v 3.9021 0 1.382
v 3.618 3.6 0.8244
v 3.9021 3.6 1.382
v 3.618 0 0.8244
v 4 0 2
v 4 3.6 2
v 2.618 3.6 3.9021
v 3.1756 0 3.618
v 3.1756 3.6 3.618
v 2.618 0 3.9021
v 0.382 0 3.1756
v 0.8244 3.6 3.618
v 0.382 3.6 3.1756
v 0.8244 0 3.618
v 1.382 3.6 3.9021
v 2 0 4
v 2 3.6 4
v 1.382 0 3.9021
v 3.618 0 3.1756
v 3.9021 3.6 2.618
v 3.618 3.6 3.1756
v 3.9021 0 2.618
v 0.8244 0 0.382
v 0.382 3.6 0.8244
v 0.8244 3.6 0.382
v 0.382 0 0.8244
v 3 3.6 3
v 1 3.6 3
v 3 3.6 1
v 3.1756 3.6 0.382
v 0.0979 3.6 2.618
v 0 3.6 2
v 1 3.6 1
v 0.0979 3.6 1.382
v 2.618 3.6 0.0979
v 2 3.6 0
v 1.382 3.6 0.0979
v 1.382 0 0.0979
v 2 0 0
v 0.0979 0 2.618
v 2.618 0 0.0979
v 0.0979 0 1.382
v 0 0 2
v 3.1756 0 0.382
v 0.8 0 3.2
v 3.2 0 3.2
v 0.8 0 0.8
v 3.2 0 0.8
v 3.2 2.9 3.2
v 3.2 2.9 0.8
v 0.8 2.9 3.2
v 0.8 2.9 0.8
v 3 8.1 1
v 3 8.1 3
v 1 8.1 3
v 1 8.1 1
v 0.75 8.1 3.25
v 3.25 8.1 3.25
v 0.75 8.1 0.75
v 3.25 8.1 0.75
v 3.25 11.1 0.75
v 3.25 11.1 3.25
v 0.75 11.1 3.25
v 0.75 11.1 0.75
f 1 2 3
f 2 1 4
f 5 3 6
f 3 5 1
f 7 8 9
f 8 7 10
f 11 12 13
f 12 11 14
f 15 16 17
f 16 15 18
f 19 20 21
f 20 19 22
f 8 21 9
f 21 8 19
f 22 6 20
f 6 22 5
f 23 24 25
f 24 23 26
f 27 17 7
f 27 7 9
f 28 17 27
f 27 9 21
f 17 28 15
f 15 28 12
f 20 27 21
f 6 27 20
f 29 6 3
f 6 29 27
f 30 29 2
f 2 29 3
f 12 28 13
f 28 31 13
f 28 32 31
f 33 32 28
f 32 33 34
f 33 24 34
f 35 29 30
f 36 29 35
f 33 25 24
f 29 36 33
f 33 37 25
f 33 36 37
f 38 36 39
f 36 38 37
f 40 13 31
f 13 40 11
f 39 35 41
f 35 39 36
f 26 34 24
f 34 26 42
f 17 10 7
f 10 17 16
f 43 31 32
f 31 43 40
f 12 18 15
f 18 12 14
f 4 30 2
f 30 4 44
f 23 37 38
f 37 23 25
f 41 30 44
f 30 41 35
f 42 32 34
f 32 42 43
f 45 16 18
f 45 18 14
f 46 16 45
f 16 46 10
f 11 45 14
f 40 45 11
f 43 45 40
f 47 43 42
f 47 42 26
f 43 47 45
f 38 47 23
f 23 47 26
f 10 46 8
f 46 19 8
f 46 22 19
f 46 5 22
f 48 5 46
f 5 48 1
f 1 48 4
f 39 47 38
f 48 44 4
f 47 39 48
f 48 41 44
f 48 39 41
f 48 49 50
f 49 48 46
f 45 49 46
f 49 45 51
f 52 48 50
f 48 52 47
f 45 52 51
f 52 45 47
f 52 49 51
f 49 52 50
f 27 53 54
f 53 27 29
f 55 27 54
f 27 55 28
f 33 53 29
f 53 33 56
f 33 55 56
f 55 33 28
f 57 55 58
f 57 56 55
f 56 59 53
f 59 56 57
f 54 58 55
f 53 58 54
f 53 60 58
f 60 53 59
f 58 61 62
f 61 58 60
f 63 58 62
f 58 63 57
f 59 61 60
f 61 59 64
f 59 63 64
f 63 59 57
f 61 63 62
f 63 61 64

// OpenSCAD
// file: shared/measurements.scad
/*
 * Keyboard Measurements
 */

pcb_thickness = 1.6;

// The plastic used to cover the TP mount's metal part to make
// sure it doesn't short the switch pins.
tp_isolator_thickness = 0.4;




/*
 * Kailh Choc Switch Measurements
 * http://www.kailh.com/uploads/allimg/171208/2-1G20Q0432C29.png
 */

// The width of the choc switch where it touches the bottom plate
choc_width_bottom = 13.6;

// The width of the choc switch with the notch that sits above the top plate
choc_width_notch = 15.0;

// How much the notch adds in width on each side
// (0.7mm)
choc_notch_width = (choc_width_notch - choc_width_bottom) / 2;

// The space from the pcb until the choc switch notch
choc_notch_to_pcb_z_space = 2.2;

// Total x distance between switch center points (choc x spacing)
choc_spacing_x = 18;

// The space between two switches at the bottom plate
// (4.4mm)
choc_switches_space_between_bottom = choc_spacing_x - choc_width_bottom;

// The space between two switches at the top with the little notch
// (3mm)
choc_switches_space_between_top = choc_spacing_x - choc_width_notch;
// file: trackpoint_extension.scad
include <shared/measurements.scad>

// Overlap Buffer for cutting
ovb = 0.01;

module draw_trackpoint_extension(
        // The height from the pcb to where you want the cap to end
        desired_cap_height,

        // How far below the pcb the TP is mounted (from start of the stem)
        tp_mounting_distance,

        // The measured width and height of the TP stem
        tp_stem_width,
        tp_stem_height,

        // The red cap dimensions
        tp_cap_height_total,
        tp_cap_hole_height,
        tp_cap_hole_width,

        // By how much you want to increase the adapter hole compared to the
        // actual TP stem width
        adapter_hole_incr=0.2,

        // By how much you want to increase the tip for a tighter cap fit
        tip_width_incr=0,

        // The thickness of the PCB
        pcb_height=1.6,

        // Whether to cut the front left and back right sides to make
        // it easier to fit between switches
        cut_sides=true) {

    adapter_width = 4;
    adapter_radius = adapter_width / 2;
    adapter_height = tp_mounting_distance + pcb_height + choc_notch_to_pcb_z_space - 0.2;

    adapter_hole_width = tp_stem_width + adapter_hole_incr;
    adapter_hole_height = tp_stem_height + adapter_hole_incr;
    adapter_hole_offset = (adapter_width - adapter_hole_width) / 2;

    // Since a portion of the extension adapter will be below the top of the
    // pcb, we calculate the length that it will extend above the pcb here
    adapter_below_pcb_height = pcb_height + tp_mounting_distance;
    adapter_above_pcb_height = adapter_height - adapter_below_pcb_height;

    tip_width = tp_cap_hole_width + tip_width_incr;
    tip_height = tp_cap_hole_height;
    tip_offset = (adapter_width - tip_width) / 2;

    // The height added on top of the stem extension. Needed for the total TP
    // extension height
    tp_cap_top_height = tp_cap_height_total - tp_cap_hole_height;

    // Height of the part between the mount at the bottom and tip at the top
    extension_height = desired_cap_height - tp_cap_top_height - tip_height - adapter_above_pcb_height;

    extension_width = 2;
    extension_offset = (adapter_width - extension_width) / 2;

    total_height = adapter_height + extension_height + tip_height;
    above_pcb_height = total_height - adapter_below_pcb_height;
    above_pcb_height_cap = above_pcb_height + tp_cap_top_height;

    echo(str("Building TP extension..."));
    echo(str("\t Total height: ", total_height, "mm"));
    echo(str("\t Below PCB height: ", adapter_below_pcb_height, "mm"));
    echo(str("\t Above PCB height: ", above_pcb_height, "mm"));
    echo(str("\t Above PCB height with cap: ", above_pcb_height_cap, "mm"));
    echo(str("\t Adapter height: ", adapter_height, "mm"));
    echo(str("\t Adapter width: ", adapter_width, "mm"));
    echo(str("\t Adapter hole height: ", adapter_hole_height, "mm (+", adapter_hole_height - tp_stem_height, "mm)"));
    echo(str("\t Adapter hole width: ", adapter_hole_width, "mm (+", adapter_hole_width - tp_stem_width, "mm)"));

    difference() {
        // Adapter
        translate([adapter_radius, 0, adapter_radius])
        rotate([-90, 0, 0])
            cylinder($fn=20, h=adapter_height,r=adapter_radius);

        // Hole
        translate([adapter_hole_offset, -ovb, adapter_hole_offset])
            cube([adapter_hole_width, adapter_hole_height + ovb, adapter_hole_width]);
    };

    // Top extension
    translate([+extension_offset, +adapter_height, +extension_offset])
        cube(
            [extension_width, extension_height, extension_width]
        );

    // Tip for red cap
    translate([+tip_offset, +adapter_height + extension_height, +tip_offset])
        cube([tip_width, tip_height, tip_width]);
}
// main file
use <trackpoint_extension.scad>

/*
 * Parameters
 */

// The height above the pcb where you want the top of the red cap to be
desired_cap_height_default = 10.5;

// Thickness of the pcb
pcb_height_default = 1.6;

// How far the TP is mounted BELOW the PCB.
// This should include the thickness of any plastic or electrical tape you use
// to isolate the TP mount.
tp_mounting_distance_default = 0;

// By how much you want to increase the adapter hole compared to the
// actual TP stem width
adapter_hole_incr_default = 0.2;

// By how much you want to increase the tip for a tighter cap fit
tip_width_incr_default = 0;


/*
 * TP Measurements
 */

// From bottom metal part to stem top
tp_total_height = 4.0;

// The metal and black bottom part.
// This is the height that sticks out below the pcb if the
// TP is mounted totally flush.
tp_board_thickness = 1.3;

// The height of the white stem
// (2.7mm)
tp_stem_height = tp_total_height - tp_board_thickness;

// TP white stem dimensions
tp_stem_width = 2.2;
tp_stem_diameter = 3.0;

// TP dot dimensions
tp_cap_height_total = 4.0;
tp_cap_hole_height = 3.0;
tp_cap_hole_width = 2.5;


module draw_tp_ext_red_t460s(
        desired_cap_height=desired_cap_height_default,
        tp_mounting_distance=tp_mounting_distance_default,
        adapter_hole_incr=adapter_hole_incr_default,
        tip_width_incr=tip_width_incr_default,
        pcb_height=pcb_height_default) {

    draw_trackpoint_extension(
        desired_cap_height=desired_cap_height,

        // How far below the pcb the TP is mounted (from start of the stem)
        tp_mounting_distance=tp_mounting_distance,

        // The measured width and height of the TP stem
        tp_stem_width=tp_stem_width,
        tp_stem_height=tp_stem_height,

        // The red cap dimensions
        tp_cap_height_total=tp_cap_height_total,
        tp_cap_hole_height=tp_cap_hole_height,
        tp_cap_hole_width=tp_cap_hole_width,

        // By how much you want to increase the adapter hole compared to the
        // actual TP stem width
        adapter_hole_incr=adapter_hole_incr,

        // By how much you want to increase the tip for a tighter cap fit
        tip_width_incr=tip_width_incr,

        // The thickness of the PCB
        pcb_height=pcb_height
    );
}

draw_tp_ext_red_t460s();
